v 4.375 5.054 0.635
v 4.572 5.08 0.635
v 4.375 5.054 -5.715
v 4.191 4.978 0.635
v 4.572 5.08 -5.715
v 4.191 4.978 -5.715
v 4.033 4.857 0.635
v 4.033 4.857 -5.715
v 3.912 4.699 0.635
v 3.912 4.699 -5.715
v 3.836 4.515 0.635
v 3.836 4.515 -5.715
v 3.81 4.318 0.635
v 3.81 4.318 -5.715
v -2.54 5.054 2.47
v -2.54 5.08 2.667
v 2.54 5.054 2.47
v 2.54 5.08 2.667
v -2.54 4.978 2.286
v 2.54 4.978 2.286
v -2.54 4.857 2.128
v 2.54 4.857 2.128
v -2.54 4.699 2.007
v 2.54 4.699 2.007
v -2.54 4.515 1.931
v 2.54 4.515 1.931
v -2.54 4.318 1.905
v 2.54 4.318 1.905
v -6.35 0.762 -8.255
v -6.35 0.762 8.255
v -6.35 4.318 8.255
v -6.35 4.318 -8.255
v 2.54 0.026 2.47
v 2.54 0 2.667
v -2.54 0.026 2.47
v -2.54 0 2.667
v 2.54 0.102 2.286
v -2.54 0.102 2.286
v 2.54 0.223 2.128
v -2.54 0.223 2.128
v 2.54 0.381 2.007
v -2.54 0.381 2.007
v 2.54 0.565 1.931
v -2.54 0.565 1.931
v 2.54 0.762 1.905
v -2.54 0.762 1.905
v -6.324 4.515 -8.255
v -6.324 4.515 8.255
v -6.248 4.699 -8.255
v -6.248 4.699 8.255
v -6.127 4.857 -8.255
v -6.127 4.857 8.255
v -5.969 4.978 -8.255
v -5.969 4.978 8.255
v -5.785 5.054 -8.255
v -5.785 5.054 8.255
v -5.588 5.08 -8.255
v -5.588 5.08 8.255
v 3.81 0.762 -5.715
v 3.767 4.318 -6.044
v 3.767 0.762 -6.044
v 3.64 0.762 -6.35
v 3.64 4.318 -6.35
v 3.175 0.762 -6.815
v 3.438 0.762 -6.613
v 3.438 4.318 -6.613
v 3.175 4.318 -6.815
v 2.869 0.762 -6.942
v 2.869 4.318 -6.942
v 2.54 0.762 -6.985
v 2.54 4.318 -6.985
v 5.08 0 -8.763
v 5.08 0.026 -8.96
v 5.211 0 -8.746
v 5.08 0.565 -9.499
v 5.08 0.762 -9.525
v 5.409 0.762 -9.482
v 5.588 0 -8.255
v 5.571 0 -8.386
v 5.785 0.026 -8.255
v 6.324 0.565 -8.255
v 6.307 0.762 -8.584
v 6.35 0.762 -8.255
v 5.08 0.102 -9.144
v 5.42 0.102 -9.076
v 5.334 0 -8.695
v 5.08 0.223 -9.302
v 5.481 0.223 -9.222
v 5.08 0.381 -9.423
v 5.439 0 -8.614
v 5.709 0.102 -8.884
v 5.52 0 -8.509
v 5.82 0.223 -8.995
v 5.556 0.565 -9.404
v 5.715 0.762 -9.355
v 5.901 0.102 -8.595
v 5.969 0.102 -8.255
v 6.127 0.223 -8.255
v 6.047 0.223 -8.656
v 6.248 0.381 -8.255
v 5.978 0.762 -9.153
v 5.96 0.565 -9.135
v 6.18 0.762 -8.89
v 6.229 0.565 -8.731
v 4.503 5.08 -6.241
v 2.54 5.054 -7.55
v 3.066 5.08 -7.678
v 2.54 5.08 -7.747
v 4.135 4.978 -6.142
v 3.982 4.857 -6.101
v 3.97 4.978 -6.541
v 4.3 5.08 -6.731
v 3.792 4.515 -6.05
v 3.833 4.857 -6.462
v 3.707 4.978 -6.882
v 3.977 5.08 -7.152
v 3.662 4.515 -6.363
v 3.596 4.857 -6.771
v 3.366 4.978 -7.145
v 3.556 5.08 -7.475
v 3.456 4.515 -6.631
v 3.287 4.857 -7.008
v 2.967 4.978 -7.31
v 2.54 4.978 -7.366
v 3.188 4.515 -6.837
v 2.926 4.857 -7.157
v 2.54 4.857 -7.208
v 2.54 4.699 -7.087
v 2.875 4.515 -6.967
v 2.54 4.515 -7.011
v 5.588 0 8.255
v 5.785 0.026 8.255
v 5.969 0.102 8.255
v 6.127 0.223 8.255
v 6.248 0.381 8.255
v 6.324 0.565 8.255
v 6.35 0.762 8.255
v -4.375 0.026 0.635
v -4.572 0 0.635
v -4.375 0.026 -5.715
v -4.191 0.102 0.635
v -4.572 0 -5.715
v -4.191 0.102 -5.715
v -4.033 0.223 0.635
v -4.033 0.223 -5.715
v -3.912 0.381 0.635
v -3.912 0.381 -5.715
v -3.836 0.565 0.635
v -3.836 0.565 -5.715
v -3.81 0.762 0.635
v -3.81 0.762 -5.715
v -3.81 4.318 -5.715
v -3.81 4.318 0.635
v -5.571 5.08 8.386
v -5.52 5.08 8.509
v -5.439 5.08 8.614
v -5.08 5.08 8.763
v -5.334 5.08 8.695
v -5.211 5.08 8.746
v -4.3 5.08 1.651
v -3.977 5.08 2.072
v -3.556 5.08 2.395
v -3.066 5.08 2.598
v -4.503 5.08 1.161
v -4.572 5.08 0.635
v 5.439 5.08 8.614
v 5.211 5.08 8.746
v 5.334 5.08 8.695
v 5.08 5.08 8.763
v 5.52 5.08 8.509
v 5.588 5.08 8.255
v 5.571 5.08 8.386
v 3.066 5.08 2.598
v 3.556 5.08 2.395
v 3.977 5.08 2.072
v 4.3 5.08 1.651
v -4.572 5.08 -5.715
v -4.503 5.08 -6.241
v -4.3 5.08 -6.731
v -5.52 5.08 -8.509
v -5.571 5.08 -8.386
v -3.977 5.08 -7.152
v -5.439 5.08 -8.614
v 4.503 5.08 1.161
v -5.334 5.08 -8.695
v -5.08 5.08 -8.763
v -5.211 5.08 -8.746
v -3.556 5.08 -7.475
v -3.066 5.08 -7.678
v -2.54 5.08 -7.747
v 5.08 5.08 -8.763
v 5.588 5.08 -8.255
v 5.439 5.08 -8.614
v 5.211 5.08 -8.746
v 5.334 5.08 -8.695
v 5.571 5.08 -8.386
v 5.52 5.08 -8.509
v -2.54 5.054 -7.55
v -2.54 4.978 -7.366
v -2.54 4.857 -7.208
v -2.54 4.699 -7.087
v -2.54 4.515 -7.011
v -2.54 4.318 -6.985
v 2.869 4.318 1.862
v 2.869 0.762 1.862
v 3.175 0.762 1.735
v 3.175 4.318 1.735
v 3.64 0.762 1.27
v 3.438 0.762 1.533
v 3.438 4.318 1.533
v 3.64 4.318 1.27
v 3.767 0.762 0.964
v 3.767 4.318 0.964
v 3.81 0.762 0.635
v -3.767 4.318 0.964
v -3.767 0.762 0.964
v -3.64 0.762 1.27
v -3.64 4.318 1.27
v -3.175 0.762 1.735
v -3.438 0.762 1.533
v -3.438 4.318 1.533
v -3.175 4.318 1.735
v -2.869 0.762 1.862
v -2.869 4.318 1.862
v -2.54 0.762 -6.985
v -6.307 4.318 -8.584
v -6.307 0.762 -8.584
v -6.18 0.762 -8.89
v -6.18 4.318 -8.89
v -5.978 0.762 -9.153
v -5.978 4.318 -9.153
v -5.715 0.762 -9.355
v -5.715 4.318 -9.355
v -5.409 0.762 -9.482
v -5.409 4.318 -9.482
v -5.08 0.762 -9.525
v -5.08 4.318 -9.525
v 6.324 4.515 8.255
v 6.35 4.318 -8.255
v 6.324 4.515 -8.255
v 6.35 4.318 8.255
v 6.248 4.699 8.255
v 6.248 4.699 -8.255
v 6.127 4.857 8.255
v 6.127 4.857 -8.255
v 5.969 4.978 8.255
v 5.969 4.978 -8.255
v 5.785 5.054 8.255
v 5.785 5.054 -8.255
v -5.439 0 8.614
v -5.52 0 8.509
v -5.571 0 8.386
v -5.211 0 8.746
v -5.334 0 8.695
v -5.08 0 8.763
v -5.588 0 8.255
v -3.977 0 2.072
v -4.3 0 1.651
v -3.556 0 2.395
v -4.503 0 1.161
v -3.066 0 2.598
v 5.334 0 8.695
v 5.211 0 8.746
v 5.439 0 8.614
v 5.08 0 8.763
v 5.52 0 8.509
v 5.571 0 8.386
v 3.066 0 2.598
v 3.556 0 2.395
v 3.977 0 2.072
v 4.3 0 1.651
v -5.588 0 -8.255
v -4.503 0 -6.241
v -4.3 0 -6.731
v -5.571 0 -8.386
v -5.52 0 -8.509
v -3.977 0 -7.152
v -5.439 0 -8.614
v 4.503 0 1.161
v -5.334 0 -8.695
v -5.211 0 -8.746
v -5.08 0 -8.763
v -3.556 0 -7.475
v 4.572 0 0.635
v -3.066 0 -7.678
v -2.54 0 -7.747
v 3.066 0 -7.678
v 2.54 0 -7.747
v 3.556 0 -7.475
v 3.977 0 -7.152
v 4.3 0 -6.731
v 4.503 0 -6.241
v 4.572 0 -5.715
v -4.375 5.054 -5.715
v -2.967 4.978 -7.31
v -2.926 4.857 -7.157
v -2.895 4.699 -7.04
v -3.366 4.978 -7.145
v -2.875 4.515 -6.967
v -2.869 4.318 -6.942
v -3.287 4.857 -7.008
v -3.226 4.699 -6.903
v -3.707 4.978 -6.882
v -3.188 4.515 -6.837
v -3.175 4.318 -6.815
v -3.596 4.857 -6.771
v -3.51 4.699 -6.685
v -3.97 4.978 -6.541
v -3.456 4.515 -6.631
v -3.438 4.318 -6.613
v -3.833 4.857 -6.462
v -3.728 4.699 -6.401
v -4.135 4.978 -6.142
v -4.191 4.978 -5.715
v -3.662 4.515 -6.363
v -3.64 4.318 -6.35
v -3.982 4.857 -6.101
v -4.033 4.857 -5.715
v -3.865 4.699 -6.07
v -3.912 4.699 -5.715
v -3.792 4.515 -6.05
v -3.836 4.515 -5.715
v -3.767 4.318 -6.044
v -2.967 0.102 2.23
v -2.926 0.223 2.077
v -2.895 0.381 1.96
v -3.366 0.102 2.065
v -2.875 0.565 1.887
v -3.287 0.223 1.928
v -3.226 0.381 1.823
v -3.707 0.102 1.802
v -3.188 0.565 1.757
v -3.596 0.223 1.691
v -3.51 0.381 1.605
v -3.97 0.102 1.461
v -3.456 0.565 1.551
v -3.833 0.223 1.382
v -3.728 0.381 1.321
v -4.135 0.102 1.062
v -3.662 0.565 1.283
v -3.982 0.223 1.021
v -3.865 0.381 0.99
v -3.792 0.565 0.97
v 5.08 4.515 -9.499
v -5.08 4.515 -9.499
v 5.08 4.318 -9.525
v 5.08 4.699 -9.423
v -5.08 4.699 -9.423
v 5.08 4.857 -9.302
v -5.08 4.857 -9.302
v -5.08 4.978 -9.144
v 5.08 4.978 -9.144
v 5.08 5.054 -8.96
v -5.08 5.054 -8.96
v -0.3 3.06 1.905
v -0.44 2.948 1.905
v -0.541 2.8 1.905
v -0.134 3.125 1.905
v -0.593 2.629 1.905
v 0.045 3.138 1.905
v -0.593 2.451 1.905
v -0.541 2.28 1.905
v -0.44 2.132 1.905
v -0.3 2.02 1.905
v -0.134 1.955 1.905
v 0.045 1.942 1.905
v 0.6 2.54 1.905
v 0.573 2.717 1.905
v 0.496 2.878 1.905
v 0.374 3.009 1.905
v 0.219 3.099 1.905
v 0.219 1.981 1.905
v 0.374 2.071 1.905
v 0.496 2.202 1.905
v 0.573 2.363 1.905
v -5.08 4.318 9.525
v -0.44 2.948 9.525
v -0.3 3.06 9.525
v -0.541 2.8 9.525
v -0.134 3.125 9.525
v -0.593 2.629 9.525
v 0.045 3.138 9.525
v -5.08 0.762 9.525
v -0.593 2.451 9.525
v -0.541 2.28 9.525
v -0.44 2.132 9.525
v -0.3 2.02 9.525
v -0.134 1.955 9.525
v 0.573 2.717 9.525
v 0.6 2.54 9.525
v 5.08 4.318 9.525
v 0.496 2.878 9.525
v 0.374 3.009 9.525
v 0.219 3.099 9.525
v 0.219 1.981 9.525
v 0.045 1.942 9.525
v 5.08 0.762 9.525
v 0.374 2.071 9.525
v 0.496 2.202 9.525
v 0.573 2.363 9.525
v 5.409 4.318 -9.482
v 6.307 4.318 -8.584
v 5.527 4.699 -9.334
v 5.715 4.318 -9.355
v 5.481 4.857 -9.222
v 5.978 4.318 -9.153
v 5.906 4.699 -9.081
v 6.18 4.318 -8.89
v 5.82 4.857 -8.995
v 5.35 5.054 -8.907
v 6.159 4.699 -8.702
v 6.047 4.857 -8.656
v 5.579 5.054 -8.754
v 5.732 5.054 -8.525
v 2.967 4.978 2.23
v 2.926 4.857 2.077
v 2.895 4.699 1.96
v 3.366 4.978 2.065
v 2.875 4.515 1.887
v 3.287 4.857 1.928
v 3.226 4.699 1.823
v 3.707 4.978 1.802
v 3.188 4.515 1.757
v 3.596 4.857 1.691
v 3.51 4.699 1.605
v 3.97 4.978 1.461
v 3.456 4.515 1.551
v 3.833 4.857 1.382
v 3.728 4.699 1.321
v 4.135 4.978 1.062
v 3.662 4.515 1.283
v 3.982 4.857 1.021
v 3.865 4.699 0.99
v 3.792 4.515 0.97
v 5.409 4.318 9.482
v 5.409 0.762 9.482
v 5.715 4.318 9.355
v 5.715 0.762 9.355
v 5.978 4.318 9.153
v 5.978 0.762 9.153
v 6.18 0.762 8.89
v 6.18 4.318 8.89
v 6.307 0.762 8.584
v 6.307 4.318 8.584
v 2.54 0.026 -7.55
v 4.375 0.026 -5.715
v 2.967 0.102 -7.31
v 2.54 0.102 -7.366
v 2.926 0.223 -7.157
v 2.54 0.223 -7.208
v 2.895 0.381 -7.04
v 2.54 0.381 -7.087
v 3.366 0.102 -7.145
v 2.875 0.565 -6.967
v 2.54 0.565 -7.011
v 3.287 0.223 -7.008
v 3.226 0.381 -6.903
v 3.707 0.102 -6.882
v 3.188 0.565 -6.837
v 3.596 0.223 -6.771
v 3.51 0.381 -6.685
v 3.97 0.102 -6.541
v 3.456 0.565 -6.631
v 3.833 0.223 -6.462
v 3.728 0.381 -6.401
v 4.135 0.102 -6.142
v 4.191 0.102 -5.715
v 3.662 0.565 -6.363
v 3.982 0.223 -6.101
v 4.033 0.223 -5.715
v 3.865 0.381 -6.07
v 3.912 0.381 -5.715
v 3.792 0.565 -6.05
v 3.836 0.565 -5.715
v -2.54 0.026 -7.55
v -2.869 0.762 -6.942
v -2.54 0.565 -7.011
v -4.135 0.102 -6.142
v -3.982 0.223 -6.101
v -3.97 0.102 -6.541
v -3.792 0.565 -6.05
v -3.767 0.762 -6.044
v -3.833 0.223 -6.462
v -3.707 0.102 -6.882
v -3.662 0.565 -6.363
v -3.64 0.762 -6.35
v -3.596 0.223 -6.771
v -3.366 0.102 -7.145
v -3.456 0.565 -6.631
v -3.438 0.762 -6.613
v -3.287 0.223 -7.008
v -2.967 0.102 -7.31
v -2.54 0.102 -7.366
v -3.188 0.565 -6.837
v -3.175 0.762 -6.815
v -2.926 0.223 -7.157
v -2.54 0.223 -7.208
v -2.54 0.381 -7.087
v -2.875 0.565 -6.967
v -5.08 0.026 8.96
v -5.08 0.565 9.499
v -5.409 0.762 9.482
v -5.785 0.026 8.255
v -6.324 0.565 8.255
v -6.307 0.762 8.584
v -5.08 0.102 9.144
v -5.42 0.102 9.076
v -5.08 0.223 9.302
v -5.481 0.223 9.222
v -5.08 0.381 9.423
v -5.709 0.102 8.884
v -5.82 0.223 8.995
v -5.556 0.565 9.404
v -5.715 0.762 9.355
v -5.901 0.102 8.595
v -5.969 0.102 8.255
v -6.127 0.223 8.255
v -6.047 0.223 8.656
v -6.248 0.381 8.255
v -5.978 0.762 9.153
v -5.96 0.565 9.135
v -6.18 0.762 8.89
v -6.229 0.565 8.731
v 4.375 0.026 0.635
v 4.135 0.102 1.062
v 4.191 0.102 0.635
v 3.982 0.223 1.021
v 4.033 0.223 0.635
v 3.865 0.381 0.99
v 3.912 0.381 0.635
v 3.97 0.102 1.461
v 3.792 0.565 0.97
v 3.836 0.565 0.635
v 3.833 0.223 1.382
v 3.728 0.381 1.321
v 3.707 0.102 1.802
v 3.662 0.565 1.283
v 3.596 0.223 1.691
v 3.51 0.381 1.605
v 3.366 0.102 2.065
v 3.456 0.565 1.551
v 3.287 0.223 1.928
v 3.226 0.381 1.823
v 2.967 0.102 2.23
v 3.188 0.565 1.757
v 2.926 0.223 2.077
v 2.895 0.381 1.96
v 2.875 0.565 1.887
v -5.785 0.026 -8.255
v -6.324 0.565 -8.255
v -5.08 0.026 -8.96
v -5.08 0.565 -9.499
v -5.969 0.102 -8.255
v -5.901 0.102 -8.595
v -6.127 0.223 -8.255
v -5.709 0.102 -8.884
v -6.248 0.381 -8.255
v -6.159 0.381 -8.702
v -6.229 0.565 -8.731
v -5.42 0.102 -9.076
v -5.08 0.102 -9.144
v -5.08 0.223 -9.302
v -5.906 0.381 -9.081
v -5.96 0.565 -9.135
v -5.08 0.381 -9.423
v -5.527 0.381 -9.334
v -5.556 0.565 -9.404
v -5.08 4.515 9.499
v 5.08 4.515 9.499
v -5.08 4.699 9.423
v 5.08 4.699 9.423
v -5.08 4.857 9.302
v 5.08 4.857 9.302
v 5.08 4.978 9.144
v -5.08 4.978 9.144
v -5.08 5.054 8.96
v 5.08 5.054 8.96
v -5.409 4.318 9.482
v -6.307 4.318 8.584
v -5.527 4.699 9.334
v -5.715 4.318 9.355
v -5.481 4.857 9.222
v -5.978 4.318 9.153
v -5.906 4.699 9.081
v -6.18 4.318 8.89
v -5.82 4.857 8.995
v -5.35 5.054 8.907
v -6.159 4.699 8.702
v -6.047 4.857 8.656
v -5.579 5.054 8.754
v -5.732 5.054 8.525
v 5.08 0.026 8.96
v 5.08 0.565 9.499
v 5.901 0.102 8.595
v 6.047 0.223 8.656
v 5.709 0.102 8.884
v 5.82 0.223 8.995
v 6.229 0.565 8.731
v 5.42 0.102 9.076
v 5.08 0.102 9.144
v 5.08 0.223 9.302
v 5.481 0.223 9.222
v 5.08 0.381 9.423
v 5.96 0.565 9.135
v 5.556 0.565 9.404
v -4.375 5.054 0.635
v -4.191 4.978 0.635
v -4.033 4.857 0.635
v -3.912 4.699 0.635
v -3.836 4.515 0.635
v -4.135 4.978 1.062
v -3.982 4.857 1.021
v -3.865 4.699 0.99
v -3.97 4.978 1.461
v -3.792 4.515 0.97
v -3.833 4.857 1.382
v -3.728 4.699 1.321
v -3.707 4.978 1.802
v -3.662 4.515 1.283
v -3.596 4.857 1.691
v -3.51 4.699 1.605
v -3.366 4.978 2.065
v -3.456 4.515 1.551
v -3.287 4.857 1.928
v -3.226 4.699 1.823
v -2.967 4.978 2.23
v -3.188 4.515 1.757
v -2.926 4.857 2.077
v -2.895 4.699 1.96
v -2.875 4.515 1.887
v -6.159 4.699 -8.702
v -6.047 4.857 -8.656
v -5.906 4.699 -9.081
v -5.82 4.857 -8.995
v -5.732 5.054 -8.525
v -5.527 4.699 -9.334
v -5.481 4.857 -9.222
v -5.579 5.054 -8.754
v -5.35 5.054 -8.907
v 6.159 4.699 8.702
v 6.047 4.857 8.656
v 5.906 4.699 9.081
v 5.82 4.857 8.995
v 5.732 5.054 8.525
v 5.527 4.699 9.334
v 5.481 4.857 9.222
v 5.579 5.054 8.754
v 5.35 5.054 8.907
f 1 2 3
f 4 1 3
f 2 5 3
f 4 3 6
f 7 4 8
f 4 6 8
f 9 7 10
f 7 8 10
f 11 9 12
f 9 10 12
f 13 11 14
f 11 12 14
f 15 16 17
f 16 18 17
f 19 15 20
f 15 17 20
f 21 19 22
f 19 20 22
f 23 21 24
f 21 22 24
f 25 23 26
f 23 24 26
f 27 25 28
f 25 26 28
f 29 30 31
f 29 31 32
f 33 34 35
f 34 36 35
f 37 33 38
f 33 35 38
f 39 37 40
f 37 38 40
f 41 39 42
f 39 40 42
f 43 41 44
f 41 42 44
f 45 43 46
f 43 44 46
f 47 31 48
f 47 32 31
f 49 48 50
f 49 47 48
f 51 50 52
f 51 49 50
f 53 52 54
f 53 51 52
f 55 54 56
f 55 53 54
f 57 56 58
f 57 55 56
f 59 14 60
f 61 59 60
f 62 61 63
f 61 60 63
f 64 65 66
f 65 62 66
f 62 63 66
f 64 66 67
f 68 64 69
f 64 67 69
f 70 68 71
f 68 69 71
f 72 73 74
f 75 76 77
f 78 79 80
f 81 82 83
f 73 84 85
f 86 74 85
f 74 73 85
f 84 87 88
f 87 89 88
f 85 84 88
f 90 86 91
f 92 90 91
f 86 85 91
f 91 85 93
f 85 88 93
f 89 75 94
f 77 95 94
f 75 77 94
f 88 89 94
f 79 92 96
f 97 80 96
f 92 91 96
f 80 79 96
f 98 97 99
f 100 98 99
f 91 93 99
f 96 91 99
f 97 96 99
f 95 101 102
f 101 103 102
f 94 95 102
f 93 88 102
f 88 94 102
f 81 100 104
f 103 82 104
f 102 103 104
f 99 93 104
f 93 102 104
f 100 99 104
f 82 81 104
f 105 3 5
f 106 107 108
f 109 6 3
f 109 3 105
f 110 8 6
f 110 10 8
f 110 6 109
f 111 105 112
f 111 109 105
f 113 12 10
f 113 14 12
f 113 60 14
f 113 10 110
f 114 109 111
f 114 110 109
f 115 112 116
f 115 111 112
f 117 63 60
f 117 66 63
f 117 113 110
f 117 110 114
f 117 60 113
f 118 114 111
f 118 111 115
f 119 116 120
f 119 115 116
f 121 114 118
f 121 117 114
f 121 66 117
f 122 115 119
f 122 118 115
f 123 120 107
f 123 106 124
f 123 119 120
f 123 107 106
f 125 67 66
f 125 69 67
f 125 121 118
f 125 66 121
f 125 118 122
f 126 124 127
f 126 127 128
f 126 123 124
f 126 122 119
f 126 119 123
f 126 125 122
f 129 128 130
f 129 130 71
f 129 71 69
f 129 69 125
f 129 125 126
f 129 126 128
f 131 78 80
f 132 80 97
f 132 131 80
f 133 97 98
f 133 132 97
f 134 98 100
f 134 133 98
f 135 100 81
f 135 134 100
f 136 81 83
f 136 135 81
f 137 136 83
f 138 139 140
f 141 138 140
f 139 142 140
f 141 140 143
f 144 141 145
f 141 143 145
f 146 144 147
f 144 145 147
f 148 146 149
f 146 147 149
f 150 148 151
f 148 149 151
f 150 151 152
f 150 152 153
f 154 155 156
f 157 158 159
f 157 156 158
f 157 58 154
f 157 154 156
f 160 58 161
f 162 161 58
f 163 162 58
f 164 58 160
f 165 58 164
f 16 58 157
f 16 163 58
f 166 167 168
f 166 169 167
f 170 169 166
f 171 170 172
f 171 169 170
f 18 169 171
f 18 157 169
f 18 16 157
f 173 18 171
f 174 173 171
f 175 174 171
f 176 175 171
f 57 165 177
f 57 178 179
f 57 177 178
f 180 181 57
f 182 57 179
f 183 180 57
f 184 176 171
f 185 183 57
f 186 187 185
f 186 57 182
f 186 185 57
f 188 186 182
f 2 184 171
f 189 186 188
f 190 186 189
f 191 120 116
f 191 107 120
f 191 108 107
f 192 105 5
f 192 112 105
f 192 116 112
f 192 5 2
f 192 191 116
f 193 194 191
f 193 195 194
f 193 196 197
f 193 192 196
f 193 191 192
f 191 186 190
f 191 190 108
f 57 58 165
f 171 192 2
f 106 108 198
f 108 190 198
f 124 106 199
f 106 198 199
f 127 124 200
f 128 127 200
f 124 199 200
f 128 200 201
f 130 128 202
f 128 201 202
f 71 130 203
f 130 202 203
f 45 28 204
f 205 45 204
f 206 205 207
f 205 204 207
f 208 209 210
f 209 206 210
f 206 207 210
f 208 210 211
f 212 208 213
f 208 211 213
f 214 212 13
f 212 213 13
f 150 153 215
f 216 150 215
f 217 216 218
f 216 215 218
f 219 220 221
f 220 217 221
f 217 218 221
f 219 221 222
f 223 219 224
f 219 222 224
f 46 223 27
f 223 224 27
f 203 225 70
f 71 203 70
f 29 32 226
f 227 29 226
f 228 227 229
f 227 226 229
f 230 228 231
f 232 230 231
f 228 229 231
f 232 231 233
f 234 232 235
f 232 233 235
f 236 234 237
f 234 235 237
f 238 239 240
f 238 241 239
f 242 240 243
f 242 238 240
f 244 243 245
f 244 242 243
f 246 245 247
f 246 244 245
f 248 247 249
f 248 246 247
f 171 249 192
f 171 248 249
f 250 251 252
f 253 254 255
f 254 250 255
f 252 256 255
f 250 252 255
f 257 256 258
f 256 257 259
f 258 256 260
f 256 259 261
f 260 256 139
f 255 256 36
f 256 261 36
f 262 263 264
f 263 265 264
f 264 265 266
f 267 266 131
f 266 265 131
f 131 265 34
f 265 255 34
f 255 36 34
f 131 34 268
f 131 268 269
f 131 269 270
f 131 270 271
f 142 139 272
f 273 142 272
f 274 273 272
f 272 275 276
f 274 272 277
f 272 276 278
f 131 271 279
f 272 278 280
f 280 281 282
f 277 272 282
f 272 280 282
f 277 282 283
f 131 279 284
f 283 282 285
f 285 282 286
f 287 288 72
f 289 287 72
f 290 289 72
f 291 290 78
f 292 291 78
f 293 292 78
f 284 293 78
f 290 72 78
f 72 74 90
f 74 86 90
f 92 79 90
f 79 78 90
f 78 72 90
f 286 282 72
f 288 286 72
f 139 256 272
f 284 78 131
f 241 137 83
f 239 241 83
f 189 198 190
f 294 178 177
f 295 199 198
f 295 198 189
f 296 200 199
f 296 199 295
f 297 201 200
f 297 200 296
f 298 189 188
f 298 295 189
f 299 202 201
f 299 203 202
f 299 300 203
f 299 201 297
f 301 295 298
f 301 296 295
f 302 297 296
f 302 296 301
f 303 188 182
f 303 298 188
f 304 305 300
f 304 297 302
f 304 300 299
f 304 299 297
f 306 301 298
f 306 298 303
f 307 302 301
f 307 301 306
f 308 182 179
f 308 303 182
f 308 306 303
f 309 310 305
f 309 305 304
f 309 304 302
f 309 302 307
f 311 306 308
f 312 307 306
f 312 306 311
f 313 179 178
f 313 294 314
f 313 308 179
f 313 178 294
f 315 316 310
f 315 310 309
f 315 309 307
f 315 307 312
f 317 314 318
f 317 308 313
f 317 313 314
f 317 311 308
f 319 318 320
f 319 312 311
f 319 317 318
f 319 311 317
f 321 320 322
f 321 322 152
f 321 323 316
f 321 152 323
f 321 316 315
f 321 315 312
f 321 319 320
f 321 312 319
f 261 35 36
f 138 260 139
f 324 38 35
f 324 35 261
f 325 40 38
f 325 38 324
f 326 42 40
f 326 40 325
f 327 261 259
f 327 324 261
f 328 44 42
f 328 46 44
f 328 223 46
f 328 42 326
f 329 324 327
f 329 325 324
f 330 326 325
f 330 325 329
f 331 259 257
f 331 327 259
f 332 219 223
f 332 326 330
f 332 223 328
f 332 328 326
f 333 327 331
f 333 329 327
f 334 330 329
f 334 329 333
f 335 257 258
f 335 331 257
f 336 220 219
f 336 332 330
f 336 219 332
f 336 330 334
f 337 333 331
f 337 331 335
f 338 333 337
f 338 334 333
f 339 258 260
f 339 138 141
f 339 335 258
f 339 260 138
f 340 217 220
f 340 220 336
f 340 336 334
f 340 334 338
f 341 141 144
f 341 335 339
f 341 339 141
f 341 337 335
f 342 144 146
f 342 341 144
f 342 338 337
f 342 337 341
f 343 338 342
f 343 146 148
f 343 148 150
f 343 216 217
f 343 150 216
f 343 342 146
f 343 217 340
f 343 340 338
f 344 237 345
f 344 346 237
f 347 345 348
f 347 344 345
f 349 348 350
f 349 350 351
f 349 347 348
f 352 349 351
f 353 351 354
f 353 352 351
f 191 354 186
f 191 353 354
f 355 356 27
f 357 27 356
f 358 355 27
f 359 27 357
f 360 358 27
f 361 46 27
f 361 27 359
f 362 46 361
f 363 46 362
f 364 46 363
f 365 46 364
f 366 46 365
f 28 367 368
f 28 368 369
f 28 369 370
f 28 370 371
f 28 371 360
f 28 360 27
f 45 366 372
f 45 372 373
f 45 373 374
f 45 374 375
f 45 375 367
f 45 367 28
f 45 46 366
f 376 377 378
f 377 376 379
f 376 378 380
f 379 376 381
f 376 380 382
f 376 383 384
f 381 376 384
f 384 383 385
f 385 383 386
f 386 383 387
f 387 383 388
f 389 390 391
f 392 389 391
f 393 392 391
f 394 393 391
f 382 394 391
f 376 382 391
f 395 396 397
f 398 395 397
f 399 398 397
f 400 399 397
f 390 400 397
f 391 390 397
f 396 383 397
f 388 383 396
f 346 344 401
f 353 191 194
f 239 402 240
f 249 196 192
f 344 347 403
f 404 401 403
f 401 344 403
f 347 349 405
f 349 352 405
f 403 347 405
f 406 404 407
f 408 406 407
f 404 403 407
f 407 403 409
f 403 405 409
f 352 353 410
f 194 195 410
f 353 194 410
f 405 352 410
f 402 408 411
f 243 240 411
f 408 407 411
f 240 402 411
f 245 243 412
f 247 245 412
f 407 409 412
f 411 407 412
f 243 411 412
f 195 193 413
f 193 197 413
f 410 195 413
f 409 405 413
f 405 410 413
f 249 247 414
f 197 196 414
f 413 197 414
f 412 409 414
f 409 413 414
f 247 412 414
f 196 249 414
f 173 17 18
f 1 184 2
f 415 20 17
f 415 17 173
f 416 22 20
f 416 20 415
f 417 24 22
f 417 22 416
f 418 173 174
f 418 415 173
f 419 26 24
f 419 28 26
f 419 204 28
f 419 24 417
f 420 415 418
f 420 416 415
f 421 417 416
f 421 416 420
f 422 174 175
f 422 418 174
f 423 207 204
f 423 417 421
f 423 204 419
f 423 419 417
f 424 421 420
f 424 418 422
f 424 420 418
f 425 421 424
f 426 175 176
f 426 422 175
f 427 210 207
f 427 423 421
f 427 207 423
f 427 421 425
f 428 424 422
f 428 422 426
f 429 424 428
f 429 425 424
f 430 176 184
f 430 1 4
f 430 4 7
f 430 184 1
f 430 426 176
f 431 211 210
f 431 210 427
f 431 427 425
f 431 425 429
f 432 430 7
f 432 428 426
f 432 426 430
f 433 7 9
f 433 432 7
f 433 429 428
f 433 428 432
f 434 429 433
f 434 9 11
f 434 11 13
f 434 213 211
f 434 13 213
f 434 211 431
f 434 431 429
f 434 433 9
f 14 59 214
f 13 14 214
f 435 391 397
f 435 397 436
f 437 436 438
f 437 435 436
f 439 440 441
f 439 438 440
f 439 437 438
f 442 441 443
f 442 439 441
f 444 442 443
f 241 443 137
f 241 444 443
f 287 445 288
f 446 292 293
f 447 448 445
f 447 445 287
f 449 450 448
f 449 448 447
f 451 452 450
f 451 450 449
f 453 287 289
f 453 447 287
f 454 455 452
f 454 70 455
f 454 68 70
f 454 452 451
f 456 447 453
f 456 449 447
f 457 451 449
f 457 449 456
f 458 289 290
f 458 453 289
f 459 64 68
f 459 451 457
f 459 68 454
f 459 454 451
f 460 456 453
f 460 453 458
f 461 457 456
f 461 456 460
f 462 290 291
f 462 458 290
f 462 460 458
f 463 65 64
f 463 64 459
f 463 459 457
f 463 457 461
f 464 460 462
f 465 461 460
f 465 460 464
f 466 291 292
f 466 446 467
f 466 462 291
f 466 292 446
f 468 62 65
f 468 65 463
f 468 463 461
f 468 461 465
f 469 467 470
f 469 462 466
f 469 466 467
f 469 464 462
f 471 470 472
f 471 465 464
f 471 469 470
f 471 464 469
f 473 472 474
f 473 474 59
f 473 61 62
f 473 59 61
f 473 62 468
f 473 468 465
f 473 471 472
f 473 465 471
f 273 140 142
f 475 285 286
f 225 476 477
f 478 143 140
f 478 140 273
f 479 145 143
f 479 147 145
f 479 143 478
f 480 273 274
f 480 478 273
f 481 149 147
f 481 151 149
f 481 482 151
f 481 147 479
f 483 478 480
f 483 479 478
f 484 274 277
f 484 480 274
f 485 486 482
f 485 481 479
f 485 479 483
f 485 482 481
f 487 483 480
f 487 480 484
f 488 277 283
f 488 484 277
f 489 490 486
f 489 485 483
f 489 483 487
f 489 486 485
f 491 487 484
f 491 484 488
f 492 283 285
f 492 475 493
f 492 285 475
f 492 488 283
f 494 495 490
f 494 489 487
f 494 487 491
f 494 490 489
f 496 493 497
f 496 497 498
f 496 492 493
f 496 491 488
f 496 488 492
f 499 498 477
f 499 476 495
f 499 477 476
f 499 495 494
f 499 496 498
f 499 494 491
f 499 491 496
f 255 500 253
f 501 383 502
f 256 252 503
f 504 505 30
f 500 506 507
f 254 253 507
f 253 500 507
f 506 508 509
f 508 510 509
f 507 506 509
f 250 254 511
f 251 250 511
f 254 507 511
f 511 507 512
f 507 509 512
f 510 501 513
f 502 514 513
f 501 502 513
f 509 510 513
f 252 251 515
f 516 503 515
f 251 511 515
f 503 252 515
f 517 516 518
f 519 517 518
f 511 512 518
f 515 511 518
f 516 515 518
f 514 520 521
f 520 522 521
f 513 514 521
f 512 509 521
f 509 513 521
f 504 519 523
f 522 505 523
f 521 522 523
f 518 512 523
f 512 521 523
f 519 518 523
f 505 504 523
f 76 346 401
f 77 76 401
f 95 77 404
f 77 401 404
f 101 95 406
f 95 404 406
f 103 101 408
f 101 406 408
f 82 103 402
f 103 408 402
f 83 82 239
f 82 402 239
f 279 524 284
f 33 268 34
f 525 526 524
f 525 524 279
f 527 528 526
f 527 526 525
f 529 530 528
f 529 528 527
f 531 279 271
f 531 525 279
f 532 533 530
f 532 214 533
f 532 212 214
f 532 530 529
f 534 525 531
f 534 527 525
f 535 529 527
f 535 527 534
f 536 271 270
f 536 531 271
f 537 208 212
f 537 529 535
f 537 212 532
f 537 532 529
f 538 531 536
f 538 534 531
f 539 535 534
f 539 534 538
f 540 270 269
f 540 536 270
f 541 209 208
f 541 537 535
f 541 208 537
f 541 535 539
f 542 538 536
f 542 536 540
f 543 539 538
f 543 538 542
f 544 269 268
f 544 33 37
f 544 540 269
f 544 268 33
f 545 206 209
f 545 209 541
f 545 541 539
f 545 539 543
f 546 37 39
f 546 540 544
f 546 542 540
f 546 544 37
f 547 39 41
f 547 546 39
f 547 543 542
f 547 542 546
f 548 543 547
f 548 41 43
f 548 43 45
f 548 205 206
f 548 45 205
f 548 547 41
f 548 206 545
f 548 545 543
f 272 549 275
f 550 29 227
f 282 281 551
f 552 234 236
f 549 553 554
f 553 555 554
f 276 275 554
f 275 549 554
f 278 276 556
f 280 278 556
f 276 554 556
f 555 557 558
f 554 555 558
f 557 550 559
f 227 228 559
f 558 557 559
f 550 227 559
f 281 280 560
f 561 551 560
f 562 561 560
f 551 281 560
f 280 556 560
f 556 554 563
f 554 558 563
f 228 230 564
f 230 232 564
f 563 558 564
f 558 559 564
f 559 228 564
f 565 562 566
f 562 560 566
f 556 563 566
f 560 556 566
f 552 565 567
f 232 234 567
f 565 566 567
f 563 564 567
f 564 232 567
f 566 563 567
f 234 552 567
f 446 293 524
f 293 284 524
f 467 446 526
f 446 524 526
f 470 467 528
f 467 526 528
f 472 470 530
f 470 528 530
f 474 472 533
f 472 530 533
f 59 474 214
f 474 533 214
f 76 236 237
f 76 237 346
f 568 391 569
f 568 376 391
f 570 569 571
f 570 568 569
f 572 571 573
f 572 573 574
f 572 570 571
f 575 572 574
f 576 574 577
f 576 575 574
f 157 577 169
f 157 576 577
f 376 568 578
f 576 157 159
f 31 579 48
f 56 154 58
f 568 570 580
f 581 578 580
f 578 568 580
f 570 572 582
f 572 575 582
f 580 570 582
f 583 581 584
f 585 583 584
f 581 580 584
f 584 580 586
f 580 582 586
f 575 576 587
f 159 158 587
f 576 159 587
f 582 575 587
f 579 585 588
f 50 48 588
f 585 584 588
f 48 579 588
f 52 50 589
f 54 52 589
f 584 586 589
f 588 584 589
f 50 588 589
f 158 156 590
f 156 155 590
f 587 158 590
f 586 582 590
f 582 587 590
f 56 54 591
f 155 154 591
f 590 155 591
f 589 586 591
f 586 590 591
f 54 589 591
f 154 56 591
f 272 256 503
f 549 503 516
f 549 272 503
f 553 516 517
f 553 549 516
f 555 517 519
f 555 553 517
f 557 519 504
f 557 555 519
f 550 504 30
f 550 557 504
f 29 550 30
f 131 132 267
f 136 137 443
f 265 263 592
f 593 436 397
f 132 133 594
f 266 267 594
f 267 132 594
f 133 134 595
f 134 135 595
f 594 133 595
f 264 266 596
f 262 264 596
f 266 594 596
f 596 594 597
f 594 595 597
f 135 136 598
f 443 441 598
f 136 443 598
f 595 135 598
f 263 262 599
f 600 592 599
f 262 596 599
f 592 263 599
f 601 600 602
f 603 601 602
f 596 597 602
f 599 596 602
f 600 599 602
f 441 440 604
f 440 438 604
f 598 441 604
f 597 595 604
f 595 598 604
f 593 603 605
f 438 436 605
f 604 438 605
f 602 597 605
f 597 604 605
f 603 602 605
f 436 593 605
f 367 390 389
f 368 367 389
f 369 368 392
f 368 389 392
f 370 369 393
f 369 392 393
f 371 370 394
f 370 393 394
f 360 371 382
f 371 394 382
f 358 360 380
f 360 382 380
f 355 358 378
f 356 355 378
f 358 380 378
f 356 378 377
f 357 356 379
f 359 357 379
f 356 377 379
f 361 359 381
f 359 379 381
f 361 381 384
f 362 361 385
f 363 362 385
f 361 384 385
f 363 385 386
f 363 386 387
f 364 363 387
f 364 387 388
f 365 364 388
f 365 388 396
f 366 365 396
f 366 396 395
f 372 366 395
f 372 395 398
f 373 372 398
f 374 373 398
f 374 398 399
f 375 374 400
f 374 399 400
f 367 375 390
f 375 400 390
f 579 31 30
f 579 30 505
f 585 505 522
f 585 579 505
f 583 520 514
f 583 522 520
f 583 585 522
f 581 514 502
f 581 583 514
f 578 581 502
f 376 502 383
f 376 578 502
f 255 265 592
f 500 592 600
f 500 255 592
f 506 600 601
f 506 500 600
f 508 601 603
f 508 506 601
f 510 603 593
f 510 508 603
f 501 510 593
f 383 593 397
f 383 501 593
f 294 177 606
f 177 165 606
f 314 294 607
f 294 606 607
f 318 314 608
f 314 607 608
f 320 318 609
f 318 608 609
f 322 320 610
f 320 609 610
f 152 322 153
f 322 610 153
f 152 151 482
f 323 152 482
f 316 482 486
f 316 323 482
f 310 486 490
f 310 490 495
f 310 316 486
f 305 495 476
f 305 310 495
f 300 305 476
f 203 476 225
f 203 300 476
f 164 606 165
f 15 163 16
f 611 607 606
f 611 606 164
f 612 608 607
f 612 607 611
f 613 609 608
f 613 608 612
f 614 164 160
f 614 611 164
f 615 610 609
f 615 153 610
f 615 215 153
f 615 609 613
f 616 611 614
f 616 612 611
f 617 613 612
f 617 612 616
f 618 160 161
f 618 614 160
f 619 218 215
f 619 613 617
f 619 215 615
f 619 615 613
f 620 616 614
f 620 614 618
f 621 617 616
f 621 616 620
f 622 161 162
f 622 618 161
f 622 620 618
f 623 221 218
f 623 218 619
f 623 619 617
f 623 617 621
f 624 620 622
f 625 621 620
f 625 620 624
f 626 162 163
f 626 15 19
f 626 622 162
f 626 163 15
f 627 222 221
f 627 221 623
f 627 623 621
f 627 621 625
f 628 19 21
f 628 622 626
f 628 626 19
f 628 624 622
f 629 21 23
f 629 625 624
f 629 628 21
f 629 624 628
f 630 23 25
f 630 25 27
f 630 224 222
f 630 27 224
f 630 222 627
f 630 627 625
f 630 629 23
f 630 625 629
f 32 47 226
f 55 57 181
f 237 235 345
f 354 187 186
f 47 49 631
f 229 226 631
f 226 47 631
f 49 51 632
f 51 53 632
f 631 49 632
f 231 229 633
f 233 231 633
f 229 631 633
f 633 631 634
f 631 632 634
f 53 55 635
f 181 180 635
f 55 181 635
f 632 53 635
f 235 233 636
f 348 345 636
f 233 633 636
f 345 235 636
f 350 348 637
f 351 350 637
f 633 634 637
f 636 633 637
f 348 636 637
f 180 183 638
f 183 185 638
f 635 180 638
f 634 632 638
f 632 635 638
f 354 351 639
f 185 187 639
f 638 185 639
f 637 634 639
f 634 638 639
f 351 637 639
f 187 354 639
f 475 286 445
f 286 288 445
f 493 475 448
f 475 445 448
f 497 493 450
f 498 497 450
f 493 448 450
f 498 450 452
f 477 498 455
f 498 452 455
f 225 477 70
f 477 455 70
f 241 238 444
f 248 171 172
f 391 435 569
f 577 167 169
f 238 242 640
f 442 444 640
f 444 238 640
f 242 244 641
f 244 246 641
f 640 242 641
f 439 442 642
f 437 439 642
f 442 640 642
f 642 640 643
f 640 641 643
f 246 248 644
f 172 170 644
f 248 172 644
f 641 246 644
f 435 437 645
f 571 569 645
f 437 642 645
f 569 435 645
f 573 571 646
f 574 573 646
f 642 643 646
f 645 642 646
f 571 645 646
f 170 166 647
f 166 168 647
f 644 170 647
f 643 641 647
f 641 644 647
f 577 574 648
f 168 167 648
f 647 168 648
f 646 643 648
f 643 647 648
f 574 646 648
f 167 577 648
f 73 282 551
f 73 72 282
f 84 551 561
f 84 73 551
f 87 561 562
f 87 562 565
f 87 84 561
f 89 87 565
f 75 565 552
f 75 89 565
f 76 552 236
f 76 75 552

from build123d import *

# Parameters (mm, degrees)
SKETCH1_W           = 12.7
SKETCH1_H           = 19.05
BOSS_EXTRUDE1_DEPTH = 5.08
SKETCH2_W           = 7.62
SKETCH2_H           = 8.89
CUT_EXTRUDE1_DEPTH  = 13.524157656
SKETCH3_R           = 0.5999988
CUT_EXTRUDE3_DEPTH  = 7.62
FILLET1_R           = 1.27
FILLET2_R           = 1.27
FILLET3_R           = 0.762
FILLET4_R           = 0.762


with BuildPart() as part:
    # Sketch1 → Boss-Extrude1 (new body)
    with BuildSketch(Plane(origin=(0, 0, 0), x_dir=(1, 0, 0), z_dir=(0, 1, 0))):
        Rectangle(SKETCH1_W, SKETCH1_H)
    extrude(amount=BOSS_EXTRUDE1_DEPTH)

    # Sketch2 → Cut-Extrude1 (cut, through all)
    with BuildSketch(Plane.XZ):
        with Locations((0, -2.54)):
            Rectangle(SKETCH2_W, SKETCH2_H)
    extrude(amount=-CUT_EXTRUDE1_DEPTH, mode=Mode.SUBTRACT)

    # Sketch3 → Cut-Extrude3 (cut)
    with BuildSketch(Plane.XY.offset(9.525)):
        with Locations((0, 2.54)):
            Circle(SKETCH3_R)
    extrude(amount=-CUT_EXTRUDE3_DEPTH, mode=Mode.SUBTRACT)

    # Fillet1
    fillet1_edges = [part.edges().sort_by_distance(p)[0] for p in [
        (6.35, 2.54, 9.525),
        (-6.35, 2.54, 9.525),
        (-6.35, 2.54, -9.525),
        (6.35, 2.54, -9.525),
    ]]
    fillet(fillet1_edges, radius=FILLET1_R)

    # Fillet2
    fillet2_edges = [part.edges().sort_by_distance(p)[0] for p in [
        (3.81, 2.54, 1.905),
        (3.81, 2.54, -6.985),
        (-3.81, 2.54, -6.985),
        (-3.81, 2.54, 1.905),
    ]]
    fillet(fillet2_edges, radius=FILLET2_R)

    # Fillet3
    fillet3_edges = [part.edges().sort_by_distance(p)[0] for p in [
        (0, 5.08, -9.525),
        (6.35, 5.08, 0),
        (-6.35, 5.08, 0),
        (0, 5.08, 9.525),
        (5.978025612, 5.08, 9.153025612),
        (-5.978025612, 5.08, 9.153025612),
        (-5.978025612, 5.08, -9.153025612),
        (5.978025612, 5.08, -9.153025612),
    ]]
    fillet(fillet3_edges, radius=FILLET3_R)

    # Fillet4
    fillet4_edges = [part.edges().sort_by_distance(p)[0] for p in [
        (0, 0, -9.525),
        (6.35, 0, 0),
        (0, 0, 9.525),
        (-6.35, 0, 0),
        (5.978025612, 0, 9.153025612),
        (-5.978025612, 0, 9.153025612),
        (-5.978025612, 0, -9.153025612),
        (5.978025612, 0, -9.153025612),
        (0, 0, -6.985),
        (0, 5.08, -6.985),
        (-3.81, 0, -2.54),
        (-3.81, 5.08, -2.54),
        (3.81, 0, -2.54),
        (3.81, 5.08, -2.54),
        (0, 0, 1.905),
        (0, 5.08, 1.905),
        (-3.438025612, 0, -6.613025612),
        (-3.438025612, 5.08, -6.613025612),
        (3.438025612, 0, -6.613025612),
        (3.438025612, 5.08, -6.613025612),
        (-3.438025612, 0, 1.533025612),
        (-3.438025612, 5.08, 1.533025612),
        (3.438025612, 0, 1.533025612),
        (3.438025612, 5.08, 1.533025612),
    ]]
    fillet(fillet4_edges, radius=FILLET4_R)


solid = part.part
